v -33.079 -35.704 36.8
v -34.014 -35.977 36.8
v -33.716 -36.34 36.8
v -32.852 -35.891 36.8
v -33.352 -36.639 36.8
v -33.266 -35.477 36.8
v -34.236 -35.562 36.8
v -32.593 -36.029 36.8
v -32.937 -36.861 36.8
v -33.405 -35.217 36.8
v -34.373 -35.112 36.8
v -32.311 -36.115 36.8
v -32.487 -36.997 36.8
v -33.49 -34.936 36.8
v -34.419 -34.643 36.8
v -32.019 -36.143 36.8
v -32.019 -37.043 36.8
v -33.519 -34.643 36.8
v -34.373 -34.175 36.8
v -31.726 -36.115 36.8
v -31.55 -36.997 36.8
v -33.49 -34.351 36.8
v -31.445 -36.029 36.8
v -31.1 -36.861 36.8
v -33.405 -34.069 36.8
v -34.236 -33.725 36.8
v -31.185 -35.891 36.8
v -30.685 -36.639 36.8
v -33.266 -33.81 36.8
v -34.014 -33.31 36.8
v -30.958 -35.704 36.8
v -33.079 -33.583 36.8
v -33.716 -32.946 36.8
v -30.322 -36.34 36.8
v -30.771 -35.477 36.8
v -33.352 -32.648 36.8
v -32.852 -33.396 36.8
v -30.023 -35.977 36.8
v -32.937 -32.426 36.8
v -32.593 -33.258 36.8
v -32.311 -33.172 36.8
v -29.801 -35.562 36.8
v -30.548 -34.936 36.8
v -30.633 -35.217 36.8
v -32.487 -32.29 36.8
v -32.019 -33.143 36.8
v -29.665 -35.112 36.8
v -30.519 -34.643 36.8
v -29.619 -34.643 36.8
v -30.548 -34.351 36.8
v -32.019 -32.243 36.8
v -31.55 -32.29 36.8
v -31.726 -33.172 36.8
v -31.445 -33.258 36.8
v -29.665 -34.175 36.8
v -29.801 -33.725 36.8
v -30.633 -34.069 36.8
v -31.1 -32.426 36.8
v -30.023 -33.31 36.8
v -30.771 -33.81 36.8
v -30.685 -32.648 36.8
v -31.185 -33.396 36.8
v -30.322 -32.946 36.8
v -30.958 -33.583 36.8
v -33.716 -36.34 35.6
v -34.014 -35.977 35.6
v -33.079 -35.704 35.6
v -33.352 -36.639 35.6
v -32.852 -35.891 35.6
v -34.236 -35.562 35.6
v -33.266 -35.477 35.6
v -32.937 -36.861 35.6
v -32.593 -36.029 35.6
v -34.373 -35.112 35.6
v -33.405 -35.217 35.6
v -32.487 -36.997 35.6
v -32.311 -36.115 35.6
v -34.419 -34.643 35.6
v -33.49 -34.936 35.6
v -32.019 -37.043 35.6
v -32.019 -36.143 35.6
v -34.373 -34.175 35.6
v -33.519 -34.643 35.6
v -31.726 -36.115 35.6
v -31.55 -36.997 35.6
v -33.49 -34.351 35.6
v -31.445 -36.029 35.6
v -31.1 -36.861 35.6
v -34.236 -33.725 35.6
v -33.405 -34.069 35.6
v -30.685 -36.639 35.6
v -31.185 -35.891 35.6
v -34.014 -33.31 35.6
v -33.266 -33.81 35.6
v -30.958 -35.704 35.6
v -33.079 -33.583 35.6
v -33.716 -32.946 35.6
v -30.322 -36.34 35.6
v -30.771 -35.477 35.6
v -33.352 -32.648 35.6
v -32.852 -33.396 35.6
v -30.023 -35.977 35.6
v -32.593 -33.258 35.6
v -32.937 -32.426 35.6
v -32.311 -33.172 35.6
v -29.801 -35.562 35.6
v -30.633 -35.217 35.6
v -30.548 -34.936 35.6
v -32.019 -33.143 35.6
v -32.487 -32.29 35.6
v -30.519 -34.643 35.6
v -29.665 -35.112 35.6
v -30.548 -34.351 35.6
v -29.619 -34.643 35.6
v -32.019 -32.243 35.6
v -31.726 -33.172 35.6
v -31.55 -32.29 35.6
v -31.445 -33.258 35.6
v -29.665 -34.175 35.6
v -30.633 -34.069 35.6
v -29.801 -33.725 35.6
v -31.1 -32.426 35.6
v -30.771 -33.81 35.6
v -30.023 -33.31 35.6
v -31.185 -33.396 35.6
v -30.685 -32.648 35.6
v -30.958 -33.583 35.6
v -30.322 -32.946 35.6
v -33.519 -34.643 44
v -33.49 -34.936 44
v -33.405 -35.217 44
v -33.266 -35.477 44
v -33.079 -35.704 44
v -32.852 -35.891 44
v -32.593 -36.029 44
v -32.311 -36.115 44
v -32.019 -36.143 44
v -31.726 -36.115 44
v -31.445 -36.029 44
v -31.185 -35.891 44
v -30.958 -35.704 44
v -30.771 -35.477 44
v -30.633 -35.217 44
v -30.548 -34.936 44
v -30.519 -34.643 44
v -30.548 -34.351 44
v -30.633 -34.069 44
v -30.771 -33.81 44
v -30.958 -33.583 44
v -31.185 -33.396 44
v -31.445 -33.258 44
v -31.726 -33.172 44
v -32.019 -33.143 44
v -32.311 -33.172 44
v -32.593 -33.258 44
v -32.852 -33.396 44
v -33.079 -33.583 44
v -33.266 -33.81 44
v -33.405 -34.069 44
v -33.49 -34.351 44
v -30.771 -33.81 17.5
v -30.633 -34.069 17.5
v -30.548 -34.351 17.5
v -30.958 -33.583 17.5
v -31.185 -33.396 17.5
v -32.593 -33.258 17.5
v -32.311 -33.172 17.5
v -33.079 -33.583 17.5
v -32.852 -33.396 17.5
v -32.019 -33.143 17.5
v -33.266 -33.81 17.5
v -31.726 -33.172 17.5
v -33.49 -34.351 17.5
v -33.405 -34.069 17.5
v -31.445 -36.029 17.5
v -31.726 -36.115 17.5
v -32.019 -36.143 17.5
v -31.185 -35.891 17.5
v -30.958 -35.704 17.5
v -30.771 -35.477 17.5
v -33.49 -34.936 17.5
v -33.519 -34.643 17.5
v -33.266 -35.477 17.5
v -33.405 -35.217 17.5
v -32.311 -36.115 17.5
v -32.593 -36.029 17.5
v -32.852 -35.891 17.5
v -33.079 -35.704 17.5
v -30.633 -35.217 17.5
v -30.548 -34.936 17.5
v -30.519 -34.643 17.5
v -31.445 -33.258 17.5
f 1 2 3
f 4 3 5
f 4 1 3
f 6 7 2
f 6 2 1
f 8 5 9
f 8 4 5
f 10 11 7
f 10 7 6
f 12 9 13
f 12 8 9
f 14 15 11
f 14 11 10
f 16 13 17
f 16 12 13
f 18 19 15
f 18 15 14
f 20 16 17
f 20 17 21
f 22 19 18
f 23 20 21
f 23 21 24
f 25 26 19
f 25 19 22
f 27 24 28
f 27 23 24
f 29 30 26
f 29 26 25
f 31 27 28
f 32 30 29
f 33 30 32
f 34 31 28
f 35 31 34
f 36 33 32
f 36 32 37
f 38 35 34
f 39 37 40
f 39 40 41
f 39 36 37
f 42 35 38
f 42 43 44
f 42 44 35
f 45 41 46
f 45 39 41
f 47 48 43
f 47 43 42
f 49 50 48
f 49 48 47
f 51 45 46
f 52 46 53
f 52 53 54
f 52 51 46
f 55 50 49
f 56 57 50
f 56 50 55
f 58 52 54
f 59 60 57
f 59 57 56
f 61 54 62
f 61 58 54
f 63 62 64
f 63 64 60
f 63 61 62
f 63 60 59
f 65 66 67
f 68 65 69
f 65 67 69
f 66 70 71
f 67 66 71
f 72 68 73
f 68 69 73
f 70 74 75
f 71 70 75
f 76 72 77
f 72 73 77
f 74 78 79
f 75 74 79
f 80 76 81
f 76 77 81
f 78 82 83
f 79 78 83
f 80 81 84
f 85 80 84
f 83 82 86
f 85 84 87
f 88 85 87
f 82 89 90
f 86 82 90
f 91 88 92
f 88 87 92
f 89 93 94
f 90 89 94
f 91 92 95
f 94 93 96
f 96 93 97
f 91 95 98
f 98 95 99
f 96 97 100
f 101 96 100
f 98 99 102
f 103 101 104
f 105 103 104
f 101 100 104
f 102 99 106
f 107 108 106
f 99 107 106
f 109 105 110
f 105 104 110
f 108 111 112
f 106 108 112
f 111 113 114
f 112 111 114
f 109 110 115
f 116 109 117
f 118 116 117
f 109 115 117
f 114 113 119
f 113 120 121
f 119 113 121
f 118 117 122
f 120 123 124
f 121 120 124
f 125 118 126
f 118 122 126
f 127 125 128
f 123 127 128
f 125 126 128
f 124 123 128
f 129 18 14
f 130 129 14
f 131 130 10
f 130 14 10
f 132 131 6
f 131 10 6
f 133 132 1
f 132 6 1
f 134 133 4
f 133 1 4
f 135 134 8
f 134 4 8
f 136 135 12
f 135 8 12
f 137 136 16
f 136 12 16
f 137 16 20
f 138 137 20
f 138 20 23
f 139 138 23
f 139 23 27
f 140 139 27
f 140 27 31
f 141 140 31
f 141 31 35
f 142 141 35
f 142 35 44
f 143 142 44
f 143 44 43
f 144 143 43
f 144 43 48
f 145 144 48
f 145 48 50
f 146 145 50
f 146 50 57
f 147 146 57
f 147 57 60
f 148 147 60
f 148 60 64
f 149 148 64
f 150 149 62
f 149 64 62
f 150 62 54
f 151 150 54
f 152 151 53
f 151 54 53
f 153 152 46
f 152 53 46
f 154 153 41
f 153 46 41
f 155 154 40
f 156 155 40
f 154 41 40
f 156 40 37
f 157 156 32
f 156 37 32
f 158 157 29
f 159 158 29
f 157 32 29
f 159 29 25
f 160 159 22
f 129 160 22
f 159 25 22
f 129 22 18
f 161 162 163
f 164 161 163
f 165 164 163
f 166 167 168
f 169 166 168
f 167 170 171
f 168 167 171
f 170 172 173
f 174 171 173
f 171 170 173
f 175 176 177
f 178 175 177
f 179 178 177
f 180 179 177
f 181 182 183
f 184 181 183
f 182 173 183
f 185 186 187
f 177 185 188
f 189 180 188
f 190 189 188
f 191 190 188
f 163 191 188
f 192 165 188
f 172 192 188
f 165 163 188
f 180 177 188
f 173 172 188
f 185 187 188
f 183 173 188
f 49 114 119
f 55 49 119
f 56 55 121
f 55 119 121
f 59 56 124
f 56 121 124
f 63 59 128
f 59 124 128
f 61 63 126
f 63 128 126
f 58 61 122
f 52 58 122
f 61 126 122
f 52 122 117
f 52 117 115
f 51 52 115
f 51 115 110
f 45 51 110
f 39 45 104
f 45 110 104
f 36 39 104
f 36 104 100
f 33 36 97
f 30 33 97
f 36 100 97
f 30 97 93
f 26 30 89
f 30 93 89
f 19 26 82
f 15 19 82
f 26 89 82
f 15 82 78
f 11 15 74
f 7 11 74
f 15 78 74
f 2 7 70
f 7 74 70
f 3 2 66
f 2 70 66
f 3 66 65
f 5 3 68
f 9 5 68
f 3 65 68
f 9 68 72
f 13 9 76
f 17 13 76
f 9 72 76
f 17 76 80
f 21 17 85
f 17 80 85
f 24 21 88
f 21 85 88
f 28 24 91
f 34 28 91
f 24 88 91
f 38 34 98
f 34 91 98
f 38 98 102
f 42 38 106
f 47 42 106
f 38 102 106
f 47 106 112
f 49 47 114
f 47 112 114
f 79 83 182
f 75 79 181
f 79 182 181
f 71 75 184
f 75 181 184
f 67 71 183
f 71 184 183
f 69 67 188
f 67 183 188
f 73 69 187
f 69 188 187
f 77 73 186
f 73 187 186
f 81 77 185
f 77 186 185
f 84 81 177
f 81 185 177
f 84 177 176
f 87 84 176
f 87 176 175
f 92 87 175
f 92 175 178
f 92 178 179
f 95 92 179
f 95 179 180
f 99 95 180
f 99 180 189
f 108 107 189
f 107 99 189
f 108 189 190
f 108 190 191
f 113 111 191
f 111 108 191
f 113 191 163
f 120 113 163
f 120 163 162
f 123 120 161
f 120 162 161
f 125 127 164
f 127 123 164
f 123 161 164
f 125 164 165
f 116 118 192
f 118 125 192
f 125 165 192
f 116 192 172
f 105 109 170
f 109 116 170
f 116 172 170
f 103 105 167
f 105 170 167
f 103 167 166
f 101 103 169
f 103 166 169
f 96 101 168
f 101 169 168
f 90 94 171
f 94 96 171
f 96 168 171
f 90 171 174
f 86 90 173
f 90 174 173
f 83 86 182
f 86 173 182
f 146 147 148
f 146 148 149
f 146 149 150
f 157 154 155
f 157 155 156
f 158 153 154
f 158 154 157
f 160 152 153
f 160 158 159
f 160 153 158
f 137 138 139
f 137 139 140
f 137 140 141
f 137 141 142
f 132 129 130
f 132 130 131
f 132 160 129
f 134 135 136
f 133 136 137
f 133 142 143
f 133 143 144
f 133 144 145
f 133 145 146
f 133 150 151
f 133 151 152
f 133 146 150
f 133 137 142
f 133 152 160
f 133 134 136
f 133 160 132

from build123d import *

# Parameters (mm, degrees)
PLUNGER_STEM_START     = 17.500063
SKETCH1_R              = 1.5
PLUNGER_STEM_DEPTH     = 26.499937
CAPTIVE_SHOULDER_START = 35.6
SKETCH2_R              = 2.4
CAPTIVE_SHOULDER_DEPTH = 1.2


with BuildPart() as part:
    # Sketch1 → Plunger_stem (new body)
    with BuildSketch(Plane.XY.offset(PLUNGER_STEM_START)):
        with Locations((-32.018684277, -34.643402341)):
            Circle(SKETCH1_R)
    extrude(amount=PLUNGER_STEM_DEPTH)

    # Sketch2 → Captive_shoulder (add)
    with BuildSketch(Plane.XY.offset(CAPTIVE_SHOULDER_START)):
        with Locations((-32.018684277, -34.643402341)):
            Circle(SKETCH2_R)
    extrude(amount=CAPTIVE_SHOULDER_DEPTH)


solid = part.part
